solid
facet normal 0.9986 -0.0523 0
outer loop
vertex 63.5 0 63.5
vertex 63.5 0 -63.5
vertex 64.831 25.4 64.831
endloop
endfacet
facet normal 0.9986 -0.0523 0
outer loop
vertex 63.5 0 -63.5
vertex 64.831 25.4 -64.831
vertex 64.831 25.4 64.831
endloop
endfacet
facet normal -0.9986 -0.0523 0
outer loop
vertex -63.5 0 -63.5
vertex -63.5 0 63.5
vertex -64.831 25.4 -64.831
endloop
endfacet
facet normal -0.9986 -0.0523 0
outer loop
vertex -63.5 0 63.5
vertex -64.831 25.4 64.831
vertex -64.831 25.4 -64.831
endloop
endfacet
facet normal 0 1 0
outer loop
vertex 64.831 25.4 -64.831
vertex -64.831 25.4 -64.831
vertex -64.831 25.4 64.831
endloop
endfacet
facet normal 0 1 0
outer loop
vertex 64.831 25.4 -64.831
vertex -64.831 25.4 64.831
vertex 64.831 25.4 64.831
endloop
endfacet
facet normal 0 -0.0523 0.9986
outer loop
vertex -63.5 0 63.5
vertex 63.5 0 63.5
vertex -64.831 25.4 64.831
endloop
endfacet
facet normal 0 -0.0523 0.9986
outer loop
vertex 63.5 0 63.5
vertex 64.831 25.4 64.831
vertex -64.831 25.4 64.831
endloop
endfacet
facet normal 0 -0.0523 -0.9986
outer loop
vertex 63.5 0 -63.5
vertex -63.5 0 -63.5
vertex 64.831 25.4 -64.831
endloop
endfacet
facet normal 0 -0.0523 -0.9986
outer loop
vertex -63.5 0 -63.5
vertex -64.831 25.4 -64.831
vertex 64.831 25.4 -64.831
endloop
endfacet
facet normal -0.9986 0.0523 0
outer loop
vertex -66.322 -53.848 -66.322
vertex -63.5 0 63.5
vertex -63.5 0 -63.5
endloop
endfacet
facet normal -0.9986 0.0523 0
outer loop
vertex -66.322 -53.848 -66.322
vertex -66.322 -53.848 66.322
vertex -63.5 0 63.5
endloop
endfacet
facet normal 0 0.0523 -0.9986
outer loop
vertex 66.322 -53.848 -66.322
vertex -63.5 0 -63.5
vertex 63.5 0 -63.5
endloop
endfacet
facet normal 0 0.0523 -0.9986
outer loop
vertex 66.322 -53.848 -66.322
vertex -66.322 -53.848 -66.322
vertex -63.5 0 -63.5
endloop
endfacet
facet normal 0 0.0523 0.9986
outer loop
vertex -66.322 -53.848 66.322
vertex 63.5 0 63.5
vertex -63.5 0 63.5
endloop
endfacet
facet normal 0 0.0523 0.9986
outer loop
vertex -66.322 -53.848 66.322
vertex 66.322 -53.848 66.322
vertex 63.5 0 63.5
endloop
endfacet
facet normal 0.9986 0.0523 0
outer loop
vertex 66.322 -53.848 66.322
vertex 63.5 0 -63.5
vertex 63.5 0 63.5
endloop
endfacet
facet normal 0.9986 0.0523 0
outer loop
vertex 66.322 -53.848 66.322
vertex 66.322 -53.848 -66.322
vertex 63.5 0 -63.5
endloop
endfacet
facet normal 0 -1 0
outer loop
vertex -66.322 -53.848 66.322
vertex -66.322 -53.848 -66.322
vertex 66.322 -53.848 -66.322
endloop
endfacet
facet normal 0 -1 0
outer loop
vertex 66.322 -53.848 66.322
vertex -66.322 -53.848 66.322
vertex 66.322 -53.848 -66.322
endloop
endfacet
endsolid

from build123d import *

# Parameters (mm, degrees)
F0_W          = 127
F0_H          = 127
F1_DEPTH      = 53.848
F1_TAPER      = -3
F1_DEPTH_BACK = 25.4
F1_TAPER_BACK = -3


with BuildPart() as f1:
    # F0 (on Front) → F1 (new body, two sides)
    with BuildSketch(Plane.XZ) as f1_sk:
        Rectangle(F0_W, F0_H)
    extrude(amount=F1_DEPTH, taper=F1_TAPER)
    extrude(f1_sk.sketch, amount=-F1_DEPTH_BACK, taper=F1_TAPER_BACK)


solid = f1.part
